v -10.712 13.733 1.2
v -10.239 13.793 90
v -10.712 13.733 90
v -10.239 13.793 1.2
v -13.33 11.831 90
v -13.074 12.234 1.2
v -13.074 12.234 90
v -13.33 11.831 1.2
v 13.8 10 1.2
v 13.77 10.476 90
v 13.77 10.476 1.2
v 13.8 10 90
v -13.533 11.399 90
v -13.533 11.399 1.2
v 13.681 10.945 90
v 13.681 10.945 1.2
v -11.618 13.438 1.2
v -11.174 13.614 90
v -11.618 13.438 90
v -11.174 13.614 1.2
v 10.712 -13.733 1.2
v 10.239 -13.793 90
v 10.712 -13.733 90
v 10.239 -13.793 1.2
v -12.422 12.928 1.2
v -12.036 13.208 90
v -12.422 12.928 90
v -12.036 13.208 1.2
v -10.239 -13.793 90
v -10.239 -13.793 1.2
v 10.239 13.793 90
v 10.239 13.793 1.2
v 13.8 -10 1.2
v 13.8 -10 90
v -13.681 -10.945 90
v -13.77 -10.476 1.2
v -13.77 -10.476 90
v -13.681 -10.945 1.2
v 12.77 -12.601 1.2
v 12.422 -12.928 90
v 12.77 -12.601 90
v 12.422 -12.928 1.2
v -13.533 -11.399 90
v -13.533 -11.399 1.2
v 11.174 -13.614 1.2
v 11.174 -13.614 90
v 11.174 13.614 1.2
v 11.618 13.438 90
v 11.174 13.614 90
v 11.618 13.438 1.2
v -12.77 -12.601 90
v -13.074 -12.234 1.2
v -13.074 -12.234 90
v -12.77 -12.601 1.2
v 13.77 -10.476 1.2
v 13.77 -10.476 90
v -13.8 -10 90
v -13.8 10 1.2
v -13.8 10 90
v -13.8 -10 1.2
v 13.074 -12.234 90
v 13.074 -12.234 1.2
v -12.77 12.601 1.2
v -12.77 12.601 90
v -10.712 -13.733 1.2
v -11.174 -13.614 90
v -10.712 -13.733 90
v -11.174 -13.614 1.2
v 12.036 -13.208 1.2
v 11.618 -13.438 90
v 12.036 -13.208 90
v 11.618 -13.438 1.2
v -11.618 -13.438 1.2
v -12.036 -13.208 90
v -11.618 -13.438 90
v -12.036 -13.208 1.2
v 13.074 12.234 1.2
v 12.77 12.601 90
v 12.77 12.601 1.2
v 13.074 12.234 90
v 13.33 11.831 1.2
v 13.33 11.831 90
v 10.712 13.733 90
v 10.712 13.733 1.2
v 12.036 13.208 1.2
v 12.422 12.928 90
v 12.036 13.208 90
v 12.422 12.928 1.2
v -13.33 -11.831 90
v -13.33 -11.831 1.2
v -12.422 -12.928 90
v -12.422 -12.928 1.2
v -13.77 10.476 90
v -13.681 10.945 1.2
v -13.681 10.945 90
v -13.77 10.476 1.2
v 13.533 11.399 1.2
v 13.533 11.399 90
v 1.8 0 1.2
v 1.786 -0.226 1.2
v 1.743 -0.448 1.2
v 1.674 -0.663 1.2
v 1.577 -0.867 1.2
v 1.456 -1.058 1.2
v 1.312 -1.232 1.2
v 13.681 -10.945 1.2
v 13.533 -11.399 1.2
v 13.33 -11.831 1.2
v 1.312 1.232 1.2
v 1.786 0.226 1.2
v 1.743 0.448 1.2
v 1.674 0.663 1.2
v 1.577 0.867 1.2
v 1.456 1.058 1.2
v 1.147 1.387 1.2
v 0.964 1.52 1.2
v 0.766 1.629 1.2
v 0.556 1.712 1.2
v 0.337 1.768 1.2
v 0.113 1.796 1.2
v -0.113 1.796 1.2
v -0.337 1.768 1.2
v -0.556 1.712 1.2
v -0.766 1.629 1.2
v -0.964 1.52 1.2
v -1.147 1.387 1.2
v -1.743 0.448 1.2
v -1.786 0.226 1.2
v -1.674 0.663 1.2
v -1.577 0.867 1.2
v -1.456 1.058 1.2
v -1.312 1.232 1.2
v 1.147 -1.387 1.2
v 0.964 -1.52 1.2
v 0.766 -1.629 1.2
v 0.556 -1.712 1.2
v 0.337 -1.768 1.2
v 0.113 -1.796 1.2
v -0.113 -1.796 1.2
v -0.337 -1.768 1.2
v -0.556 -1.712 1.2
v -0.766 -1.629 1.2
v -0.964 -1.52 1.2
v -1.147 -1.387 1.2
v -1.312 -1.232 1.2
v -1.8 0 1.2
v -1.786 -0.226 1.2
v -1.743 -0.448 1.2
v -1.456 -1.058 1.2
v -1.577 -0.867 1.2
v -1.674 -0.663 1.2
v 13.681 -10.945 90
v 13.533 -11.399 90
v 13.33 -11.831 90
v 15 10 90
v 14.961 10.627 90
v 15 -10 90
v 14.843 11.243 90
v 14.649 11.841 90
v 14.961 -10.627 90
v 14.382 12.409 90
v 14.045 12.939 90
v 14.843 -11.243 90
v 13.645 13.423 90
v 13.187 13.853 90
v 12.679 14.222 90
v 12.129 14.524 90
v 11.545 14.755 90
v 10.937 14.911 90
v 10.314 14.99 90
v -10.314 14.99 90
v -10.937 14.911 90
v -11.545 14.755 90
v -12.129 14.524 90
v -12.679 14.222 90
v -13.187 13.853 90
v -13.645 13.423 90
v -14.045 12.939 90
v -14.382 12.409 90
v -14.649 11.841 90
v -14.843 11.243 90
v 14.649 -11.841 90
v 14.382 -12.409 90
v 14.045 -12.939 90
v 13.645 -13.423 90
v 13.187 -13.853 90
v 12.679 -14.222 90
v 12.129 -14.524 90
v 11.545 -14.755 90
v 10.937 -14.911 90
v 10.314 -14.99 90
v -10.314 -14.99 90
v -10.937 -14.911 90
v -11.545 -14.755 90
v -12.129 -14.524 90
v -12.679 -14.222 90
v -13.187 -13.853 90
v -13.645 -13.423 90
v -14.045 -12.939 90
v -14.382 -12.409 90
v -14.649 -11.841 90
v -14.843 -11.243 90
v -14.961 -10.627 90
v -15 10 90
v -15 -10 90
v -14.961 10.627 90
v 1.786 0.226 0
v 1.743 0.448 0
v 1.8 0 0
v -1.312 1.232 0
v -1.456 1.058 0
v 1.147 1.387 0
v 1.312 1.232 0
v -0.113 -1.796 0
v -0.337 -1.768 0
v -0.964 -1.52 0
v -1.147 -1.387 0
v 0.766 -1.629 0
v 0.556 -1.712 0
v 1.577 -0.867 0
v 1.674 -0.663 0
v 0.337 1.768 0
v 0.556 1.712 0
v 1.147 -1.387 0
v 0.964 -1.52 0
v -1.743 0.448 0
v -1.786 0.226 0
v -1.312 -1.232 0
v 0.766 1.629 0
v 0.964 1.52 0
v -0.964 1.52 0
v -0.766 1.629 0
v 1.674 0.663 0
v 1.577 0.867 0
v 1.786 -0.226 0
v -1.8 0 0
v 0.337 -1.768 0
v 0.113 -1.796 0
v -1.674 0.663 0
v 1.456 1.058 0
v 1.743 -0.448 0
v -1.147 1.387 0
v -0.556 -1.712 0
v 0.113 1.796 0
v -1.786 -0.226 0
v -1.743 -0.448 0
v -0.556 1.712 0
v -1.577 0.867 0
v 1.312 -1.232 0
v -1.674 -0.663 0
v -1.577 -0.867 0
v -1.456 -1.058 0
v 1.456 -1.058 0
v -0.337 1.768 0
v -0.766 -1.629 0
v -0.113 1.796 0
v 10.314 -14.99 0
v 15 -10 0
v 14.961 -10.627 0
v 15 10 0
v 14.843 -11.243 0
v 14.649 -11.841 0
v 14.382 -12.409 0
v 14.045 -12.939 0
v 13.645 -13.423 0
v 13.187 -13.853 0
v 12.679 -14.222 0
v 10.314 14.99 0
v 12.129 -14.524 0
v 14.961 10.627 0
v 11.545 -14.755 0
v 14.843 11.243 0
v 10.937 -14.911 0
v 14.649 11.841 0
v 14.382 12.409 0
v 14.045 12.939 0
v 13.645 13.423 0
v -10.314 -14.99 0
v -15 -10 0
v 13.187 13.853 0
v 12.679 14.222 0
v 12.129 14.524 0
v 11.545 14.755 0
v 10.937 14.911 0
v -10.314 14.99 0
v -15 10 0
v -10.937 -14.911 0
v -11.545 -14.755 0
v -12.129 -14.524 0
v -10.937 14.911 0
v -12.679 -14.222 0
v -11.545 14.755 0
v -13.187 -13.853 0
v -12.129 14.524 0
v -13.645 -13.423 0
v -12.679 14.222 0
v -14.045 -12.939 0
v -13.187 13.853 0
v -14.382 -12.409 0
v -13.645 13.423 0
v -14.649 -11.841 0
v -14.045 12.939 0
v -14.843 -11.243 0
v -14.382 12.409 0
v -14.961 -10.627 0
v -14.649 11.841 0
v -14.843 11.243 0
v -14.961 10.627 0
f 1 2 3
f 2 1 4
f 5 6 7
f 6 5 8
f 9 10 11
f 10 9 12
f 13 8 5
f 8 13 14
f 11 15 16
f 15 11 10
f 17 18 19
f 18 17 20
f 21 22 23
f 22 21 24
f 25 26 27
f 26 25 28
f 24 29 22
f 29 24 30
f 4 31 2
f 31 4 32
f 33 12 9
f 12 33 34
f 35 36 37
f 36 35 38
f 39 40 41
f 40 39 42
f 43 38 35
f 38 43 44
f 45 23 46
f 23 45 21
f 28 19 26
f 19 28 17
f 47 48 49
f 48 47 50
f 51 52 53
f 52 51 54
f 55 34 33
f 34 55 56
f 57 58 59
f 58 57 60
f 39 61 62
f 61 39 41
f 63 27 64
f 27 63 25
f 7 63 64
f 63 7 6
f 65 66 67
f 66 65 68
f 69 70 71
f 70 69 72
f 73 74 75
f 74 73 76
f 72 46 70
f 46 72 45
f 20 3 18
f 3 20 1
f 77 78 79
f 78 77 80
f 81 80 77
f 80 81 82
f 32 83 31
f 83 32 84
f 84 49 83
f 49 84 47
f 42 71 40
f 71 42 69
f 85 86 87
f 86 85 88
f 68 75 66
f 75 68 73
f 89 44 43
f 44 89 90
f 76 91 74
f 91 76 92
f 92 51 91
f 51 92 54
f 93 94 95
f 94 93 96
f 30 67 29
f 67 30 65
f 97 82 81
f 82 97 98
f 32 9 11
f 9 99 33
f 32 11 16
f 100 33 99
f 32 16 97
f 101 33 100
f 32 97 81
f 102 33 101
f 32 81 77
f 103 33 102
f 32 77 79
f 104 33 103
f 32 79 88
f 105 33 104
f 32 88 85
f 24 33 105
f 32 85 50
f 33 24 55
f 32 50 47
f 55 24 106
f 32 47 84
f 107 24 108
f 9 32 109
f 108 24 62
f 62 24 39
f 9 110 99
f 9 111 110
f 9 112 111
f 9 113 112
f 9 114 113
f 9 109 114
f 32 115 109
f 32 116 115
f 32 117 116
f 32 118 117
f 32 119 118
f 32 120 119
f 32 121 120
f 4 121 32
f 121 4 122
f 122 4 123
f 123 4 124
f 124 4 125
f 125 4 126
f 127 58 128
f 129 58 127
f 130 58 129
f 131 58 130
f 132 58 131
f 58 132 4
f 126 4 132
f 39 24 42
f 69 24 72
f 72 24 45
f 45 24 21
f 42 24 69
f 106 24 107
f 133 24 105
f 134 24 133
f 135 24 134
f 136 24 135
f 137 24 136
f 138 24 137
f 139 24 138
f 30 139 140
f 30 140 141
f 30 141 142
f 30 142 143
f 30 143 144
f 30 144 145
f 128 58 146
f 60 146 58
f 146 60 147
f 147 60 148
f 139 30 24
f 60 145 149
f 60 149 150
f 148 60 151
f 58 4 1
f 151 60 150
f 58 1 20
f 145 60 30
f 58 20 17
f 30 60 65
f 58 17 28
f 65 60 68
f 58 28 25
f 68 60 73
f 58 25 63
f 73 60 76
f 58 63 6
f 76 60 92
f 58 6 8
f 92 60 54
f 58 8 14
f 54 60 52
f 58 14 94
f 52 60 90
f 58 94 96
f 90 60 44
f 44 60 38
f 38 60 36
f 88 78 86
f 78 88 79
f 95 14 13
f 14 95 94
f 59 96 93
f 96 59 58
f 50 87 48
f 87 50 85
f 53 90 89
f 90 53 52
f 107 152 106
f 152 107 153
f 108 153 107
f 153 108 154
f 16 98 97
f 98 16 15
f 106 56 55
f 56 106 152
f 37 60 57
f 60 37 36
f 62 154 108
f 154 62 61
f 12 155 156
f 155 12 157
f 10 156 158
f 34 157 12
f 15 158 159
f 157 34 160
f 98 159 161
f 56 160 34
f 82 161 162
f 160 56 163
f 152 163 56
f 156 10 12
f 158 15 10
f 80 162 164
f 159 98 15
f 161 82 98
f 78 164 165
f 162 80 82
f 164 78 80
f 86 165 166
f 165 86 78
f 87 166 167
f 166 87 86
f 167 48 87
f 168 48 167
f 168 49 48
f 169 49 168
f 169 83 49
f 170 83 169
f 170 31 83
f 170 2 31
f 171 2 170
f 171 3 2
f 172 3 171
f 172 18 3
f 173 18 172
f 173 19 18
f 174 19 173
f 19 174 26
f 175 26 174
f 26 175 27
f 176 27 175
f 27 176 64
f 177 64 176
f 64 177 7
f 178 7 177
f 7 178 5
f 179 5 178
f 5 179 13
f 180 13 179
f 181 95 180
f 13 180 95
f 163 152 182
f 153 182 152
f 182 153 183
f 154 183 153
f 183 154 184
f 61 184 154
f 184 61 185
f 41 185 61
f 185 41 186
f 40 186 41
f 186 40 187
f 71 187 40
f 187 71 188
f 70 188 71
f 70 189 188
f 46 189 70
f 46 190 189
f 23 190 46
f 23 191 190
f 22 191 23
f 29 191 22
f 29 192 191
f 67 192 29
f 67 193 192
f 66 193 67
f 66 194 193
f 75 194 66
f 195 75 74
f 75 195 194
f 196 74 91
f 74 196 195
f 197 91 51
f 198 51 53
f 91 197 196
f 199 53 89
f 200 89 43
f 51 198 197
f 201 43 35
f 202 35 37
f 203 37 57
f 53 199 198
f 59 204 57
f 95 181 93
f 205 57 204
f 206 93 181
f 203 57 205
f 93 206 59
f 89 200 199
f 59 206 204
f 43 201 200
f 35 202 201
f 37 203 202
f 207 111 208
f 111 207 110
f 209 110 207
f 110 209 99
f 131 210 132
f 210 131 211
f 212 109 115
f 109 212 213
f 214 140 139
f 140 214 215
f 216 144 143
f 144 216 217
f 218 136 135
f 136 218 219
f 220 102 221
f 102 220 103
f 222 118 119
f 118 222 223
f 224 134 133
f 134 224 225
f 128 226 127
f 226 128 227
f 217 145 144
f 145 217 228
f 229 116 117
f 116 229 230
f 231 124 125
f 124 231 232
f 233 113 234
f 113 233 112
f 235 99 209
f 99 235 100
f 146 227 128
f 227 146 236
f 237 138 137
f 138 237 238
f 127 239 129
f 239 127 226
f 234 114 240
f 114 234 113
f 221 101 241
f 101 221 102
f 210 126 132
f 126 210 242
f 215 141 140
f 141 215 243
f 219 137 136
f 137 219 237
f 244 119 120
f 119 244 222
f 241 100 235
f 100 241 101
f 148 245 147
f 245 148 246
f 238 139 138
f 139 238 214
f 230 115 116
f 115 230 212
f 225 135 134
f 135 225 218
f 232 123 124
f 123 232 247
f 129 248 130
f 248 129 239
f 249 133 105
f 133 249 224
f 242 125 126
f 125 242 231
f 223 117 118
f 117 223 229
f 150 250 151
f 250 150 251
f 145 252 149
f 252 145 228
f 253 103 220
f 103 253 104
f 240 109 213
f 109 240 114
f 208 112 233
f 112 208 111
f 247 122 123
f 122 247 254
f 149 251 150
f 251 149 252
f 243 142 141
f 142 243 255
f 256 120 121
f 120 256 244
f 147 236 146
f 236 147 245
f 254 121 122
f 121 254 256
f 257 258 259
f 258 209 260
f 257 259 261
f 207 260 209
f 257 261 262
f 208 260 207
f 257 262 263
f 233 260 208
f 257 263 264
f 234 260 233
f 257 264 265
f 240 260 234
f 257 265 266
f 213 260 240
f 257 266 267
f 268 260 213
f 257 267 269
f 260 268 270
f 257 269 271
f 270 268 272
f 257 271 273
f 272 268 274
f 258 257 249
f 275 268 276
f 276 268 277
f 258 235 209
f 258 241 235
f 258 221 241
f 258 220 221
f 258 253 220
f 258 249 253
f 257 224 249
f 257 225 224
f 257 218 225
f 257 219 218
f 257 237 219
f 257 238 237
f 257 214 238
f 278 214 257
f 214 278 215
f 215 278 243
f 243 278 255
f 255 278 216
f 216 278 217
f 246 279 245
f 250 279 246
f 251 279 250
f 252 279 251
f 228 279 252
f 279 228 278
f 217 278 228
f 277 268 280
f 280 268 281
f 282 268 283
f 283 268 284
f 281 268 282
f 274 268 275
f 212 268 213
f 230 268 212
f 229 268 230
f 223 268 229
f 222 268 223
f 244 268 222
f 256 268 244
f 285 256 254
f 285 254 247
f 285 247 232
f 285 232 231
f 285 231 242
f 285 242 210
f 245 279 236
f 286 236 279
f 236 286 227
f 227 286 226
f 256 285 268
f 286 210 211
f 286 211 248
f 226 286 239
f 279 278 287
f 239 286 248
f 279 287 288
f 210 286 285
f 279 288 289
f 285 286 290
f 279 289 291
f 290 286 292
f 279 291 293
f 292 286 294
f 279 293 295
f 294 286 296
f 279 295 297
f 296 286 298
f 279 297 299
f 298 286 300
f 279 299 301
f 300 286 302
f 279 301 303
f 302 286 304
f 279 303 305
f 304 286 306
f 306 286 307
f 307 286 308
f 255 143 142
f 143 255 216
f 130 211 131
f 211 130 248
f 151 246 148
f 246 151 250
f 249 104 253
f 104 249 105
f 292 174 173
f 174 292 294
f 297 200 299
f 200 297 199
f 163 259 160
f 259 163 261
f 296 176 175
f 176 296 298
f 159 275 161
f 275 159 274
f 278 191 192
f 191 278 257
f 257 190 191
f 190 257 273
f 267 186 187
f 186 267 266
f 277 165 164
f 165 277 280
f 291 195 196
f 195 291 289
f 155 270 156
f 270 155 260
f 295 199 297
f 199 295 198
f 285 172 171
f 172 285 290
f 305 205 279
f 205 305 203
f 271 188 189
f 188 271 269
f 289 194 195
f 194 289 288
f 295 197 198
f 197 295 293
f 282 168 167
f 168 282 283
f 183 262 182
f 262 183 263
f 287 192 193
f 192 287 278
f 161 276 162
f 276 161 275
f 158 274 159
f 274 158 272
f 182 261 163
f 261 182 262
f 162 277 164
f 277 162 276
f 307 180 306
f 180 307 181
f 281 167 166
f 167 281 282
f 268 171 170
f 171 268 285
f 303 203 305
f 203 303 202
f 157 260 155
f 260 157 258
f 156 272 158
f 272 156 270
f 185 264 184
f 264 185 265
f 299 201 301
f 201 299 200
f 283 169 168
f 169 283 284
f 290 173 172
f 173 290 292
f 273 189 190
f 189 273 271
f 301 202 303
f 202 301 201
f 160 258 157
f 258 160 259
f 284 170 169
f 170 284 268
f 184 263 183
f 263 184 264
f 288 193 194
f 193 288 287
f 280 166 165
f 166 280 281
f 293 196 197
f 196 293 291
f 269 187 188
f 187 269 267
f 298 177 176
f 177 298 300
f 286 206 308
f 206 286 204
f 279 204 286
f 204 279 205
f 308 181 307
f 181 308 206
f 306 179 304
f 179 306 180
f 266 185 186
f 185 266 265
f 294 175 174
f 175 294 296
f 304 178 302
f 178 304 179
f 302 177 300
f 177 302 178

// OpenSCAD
$fn = 50;


difference() {
	union() {
		hull() {
			translate(v = [-10.0000000000, 10.0000000000, 0]) {
				cylinder(h = 90, r = 5);
			}
			translate(v = [10.0000000000, 10.0000000000, 0]) {
				cylinder(h = 90, r = 5);
			}
			translate(v = [-10.0000000000, -10.0000000000, 0]) {
				cylinder(h = 90, r = 5);
			}
			translate(v = [10.0000000000, -10.0000000000, 0]) {
				cylinder(h = 90, r = 5);
			}
		}
	}
	union() {
		translate(v = [0, 0, 1.2000000000]) {
			hull() {
				translate(v = [-10.0000000000, 10.0000000000, 0]) {
					cylinder(h = 88.8000000000, r = 3.8000000000);
				}
				translate(v = [10.0000000000, 10.0000000000, 0]) {
					cylinder(h = 88.8000000000, r = 3.8000000000);
				}
				translate(v = [-10.0000000000, -10.0000000000, 0]) {
					cylinder(h = 88.8000000000, r = 3.8000000000);
				}
				translate(v = [10.0000000000, -10.0000000000, 0]) {
					cylinder(h = 88.8000000000, r = 3.8000000000);
				}
			}
		}
		#cylinder(h = 1.2000000000, r = 1.8000000000);
	}
}
